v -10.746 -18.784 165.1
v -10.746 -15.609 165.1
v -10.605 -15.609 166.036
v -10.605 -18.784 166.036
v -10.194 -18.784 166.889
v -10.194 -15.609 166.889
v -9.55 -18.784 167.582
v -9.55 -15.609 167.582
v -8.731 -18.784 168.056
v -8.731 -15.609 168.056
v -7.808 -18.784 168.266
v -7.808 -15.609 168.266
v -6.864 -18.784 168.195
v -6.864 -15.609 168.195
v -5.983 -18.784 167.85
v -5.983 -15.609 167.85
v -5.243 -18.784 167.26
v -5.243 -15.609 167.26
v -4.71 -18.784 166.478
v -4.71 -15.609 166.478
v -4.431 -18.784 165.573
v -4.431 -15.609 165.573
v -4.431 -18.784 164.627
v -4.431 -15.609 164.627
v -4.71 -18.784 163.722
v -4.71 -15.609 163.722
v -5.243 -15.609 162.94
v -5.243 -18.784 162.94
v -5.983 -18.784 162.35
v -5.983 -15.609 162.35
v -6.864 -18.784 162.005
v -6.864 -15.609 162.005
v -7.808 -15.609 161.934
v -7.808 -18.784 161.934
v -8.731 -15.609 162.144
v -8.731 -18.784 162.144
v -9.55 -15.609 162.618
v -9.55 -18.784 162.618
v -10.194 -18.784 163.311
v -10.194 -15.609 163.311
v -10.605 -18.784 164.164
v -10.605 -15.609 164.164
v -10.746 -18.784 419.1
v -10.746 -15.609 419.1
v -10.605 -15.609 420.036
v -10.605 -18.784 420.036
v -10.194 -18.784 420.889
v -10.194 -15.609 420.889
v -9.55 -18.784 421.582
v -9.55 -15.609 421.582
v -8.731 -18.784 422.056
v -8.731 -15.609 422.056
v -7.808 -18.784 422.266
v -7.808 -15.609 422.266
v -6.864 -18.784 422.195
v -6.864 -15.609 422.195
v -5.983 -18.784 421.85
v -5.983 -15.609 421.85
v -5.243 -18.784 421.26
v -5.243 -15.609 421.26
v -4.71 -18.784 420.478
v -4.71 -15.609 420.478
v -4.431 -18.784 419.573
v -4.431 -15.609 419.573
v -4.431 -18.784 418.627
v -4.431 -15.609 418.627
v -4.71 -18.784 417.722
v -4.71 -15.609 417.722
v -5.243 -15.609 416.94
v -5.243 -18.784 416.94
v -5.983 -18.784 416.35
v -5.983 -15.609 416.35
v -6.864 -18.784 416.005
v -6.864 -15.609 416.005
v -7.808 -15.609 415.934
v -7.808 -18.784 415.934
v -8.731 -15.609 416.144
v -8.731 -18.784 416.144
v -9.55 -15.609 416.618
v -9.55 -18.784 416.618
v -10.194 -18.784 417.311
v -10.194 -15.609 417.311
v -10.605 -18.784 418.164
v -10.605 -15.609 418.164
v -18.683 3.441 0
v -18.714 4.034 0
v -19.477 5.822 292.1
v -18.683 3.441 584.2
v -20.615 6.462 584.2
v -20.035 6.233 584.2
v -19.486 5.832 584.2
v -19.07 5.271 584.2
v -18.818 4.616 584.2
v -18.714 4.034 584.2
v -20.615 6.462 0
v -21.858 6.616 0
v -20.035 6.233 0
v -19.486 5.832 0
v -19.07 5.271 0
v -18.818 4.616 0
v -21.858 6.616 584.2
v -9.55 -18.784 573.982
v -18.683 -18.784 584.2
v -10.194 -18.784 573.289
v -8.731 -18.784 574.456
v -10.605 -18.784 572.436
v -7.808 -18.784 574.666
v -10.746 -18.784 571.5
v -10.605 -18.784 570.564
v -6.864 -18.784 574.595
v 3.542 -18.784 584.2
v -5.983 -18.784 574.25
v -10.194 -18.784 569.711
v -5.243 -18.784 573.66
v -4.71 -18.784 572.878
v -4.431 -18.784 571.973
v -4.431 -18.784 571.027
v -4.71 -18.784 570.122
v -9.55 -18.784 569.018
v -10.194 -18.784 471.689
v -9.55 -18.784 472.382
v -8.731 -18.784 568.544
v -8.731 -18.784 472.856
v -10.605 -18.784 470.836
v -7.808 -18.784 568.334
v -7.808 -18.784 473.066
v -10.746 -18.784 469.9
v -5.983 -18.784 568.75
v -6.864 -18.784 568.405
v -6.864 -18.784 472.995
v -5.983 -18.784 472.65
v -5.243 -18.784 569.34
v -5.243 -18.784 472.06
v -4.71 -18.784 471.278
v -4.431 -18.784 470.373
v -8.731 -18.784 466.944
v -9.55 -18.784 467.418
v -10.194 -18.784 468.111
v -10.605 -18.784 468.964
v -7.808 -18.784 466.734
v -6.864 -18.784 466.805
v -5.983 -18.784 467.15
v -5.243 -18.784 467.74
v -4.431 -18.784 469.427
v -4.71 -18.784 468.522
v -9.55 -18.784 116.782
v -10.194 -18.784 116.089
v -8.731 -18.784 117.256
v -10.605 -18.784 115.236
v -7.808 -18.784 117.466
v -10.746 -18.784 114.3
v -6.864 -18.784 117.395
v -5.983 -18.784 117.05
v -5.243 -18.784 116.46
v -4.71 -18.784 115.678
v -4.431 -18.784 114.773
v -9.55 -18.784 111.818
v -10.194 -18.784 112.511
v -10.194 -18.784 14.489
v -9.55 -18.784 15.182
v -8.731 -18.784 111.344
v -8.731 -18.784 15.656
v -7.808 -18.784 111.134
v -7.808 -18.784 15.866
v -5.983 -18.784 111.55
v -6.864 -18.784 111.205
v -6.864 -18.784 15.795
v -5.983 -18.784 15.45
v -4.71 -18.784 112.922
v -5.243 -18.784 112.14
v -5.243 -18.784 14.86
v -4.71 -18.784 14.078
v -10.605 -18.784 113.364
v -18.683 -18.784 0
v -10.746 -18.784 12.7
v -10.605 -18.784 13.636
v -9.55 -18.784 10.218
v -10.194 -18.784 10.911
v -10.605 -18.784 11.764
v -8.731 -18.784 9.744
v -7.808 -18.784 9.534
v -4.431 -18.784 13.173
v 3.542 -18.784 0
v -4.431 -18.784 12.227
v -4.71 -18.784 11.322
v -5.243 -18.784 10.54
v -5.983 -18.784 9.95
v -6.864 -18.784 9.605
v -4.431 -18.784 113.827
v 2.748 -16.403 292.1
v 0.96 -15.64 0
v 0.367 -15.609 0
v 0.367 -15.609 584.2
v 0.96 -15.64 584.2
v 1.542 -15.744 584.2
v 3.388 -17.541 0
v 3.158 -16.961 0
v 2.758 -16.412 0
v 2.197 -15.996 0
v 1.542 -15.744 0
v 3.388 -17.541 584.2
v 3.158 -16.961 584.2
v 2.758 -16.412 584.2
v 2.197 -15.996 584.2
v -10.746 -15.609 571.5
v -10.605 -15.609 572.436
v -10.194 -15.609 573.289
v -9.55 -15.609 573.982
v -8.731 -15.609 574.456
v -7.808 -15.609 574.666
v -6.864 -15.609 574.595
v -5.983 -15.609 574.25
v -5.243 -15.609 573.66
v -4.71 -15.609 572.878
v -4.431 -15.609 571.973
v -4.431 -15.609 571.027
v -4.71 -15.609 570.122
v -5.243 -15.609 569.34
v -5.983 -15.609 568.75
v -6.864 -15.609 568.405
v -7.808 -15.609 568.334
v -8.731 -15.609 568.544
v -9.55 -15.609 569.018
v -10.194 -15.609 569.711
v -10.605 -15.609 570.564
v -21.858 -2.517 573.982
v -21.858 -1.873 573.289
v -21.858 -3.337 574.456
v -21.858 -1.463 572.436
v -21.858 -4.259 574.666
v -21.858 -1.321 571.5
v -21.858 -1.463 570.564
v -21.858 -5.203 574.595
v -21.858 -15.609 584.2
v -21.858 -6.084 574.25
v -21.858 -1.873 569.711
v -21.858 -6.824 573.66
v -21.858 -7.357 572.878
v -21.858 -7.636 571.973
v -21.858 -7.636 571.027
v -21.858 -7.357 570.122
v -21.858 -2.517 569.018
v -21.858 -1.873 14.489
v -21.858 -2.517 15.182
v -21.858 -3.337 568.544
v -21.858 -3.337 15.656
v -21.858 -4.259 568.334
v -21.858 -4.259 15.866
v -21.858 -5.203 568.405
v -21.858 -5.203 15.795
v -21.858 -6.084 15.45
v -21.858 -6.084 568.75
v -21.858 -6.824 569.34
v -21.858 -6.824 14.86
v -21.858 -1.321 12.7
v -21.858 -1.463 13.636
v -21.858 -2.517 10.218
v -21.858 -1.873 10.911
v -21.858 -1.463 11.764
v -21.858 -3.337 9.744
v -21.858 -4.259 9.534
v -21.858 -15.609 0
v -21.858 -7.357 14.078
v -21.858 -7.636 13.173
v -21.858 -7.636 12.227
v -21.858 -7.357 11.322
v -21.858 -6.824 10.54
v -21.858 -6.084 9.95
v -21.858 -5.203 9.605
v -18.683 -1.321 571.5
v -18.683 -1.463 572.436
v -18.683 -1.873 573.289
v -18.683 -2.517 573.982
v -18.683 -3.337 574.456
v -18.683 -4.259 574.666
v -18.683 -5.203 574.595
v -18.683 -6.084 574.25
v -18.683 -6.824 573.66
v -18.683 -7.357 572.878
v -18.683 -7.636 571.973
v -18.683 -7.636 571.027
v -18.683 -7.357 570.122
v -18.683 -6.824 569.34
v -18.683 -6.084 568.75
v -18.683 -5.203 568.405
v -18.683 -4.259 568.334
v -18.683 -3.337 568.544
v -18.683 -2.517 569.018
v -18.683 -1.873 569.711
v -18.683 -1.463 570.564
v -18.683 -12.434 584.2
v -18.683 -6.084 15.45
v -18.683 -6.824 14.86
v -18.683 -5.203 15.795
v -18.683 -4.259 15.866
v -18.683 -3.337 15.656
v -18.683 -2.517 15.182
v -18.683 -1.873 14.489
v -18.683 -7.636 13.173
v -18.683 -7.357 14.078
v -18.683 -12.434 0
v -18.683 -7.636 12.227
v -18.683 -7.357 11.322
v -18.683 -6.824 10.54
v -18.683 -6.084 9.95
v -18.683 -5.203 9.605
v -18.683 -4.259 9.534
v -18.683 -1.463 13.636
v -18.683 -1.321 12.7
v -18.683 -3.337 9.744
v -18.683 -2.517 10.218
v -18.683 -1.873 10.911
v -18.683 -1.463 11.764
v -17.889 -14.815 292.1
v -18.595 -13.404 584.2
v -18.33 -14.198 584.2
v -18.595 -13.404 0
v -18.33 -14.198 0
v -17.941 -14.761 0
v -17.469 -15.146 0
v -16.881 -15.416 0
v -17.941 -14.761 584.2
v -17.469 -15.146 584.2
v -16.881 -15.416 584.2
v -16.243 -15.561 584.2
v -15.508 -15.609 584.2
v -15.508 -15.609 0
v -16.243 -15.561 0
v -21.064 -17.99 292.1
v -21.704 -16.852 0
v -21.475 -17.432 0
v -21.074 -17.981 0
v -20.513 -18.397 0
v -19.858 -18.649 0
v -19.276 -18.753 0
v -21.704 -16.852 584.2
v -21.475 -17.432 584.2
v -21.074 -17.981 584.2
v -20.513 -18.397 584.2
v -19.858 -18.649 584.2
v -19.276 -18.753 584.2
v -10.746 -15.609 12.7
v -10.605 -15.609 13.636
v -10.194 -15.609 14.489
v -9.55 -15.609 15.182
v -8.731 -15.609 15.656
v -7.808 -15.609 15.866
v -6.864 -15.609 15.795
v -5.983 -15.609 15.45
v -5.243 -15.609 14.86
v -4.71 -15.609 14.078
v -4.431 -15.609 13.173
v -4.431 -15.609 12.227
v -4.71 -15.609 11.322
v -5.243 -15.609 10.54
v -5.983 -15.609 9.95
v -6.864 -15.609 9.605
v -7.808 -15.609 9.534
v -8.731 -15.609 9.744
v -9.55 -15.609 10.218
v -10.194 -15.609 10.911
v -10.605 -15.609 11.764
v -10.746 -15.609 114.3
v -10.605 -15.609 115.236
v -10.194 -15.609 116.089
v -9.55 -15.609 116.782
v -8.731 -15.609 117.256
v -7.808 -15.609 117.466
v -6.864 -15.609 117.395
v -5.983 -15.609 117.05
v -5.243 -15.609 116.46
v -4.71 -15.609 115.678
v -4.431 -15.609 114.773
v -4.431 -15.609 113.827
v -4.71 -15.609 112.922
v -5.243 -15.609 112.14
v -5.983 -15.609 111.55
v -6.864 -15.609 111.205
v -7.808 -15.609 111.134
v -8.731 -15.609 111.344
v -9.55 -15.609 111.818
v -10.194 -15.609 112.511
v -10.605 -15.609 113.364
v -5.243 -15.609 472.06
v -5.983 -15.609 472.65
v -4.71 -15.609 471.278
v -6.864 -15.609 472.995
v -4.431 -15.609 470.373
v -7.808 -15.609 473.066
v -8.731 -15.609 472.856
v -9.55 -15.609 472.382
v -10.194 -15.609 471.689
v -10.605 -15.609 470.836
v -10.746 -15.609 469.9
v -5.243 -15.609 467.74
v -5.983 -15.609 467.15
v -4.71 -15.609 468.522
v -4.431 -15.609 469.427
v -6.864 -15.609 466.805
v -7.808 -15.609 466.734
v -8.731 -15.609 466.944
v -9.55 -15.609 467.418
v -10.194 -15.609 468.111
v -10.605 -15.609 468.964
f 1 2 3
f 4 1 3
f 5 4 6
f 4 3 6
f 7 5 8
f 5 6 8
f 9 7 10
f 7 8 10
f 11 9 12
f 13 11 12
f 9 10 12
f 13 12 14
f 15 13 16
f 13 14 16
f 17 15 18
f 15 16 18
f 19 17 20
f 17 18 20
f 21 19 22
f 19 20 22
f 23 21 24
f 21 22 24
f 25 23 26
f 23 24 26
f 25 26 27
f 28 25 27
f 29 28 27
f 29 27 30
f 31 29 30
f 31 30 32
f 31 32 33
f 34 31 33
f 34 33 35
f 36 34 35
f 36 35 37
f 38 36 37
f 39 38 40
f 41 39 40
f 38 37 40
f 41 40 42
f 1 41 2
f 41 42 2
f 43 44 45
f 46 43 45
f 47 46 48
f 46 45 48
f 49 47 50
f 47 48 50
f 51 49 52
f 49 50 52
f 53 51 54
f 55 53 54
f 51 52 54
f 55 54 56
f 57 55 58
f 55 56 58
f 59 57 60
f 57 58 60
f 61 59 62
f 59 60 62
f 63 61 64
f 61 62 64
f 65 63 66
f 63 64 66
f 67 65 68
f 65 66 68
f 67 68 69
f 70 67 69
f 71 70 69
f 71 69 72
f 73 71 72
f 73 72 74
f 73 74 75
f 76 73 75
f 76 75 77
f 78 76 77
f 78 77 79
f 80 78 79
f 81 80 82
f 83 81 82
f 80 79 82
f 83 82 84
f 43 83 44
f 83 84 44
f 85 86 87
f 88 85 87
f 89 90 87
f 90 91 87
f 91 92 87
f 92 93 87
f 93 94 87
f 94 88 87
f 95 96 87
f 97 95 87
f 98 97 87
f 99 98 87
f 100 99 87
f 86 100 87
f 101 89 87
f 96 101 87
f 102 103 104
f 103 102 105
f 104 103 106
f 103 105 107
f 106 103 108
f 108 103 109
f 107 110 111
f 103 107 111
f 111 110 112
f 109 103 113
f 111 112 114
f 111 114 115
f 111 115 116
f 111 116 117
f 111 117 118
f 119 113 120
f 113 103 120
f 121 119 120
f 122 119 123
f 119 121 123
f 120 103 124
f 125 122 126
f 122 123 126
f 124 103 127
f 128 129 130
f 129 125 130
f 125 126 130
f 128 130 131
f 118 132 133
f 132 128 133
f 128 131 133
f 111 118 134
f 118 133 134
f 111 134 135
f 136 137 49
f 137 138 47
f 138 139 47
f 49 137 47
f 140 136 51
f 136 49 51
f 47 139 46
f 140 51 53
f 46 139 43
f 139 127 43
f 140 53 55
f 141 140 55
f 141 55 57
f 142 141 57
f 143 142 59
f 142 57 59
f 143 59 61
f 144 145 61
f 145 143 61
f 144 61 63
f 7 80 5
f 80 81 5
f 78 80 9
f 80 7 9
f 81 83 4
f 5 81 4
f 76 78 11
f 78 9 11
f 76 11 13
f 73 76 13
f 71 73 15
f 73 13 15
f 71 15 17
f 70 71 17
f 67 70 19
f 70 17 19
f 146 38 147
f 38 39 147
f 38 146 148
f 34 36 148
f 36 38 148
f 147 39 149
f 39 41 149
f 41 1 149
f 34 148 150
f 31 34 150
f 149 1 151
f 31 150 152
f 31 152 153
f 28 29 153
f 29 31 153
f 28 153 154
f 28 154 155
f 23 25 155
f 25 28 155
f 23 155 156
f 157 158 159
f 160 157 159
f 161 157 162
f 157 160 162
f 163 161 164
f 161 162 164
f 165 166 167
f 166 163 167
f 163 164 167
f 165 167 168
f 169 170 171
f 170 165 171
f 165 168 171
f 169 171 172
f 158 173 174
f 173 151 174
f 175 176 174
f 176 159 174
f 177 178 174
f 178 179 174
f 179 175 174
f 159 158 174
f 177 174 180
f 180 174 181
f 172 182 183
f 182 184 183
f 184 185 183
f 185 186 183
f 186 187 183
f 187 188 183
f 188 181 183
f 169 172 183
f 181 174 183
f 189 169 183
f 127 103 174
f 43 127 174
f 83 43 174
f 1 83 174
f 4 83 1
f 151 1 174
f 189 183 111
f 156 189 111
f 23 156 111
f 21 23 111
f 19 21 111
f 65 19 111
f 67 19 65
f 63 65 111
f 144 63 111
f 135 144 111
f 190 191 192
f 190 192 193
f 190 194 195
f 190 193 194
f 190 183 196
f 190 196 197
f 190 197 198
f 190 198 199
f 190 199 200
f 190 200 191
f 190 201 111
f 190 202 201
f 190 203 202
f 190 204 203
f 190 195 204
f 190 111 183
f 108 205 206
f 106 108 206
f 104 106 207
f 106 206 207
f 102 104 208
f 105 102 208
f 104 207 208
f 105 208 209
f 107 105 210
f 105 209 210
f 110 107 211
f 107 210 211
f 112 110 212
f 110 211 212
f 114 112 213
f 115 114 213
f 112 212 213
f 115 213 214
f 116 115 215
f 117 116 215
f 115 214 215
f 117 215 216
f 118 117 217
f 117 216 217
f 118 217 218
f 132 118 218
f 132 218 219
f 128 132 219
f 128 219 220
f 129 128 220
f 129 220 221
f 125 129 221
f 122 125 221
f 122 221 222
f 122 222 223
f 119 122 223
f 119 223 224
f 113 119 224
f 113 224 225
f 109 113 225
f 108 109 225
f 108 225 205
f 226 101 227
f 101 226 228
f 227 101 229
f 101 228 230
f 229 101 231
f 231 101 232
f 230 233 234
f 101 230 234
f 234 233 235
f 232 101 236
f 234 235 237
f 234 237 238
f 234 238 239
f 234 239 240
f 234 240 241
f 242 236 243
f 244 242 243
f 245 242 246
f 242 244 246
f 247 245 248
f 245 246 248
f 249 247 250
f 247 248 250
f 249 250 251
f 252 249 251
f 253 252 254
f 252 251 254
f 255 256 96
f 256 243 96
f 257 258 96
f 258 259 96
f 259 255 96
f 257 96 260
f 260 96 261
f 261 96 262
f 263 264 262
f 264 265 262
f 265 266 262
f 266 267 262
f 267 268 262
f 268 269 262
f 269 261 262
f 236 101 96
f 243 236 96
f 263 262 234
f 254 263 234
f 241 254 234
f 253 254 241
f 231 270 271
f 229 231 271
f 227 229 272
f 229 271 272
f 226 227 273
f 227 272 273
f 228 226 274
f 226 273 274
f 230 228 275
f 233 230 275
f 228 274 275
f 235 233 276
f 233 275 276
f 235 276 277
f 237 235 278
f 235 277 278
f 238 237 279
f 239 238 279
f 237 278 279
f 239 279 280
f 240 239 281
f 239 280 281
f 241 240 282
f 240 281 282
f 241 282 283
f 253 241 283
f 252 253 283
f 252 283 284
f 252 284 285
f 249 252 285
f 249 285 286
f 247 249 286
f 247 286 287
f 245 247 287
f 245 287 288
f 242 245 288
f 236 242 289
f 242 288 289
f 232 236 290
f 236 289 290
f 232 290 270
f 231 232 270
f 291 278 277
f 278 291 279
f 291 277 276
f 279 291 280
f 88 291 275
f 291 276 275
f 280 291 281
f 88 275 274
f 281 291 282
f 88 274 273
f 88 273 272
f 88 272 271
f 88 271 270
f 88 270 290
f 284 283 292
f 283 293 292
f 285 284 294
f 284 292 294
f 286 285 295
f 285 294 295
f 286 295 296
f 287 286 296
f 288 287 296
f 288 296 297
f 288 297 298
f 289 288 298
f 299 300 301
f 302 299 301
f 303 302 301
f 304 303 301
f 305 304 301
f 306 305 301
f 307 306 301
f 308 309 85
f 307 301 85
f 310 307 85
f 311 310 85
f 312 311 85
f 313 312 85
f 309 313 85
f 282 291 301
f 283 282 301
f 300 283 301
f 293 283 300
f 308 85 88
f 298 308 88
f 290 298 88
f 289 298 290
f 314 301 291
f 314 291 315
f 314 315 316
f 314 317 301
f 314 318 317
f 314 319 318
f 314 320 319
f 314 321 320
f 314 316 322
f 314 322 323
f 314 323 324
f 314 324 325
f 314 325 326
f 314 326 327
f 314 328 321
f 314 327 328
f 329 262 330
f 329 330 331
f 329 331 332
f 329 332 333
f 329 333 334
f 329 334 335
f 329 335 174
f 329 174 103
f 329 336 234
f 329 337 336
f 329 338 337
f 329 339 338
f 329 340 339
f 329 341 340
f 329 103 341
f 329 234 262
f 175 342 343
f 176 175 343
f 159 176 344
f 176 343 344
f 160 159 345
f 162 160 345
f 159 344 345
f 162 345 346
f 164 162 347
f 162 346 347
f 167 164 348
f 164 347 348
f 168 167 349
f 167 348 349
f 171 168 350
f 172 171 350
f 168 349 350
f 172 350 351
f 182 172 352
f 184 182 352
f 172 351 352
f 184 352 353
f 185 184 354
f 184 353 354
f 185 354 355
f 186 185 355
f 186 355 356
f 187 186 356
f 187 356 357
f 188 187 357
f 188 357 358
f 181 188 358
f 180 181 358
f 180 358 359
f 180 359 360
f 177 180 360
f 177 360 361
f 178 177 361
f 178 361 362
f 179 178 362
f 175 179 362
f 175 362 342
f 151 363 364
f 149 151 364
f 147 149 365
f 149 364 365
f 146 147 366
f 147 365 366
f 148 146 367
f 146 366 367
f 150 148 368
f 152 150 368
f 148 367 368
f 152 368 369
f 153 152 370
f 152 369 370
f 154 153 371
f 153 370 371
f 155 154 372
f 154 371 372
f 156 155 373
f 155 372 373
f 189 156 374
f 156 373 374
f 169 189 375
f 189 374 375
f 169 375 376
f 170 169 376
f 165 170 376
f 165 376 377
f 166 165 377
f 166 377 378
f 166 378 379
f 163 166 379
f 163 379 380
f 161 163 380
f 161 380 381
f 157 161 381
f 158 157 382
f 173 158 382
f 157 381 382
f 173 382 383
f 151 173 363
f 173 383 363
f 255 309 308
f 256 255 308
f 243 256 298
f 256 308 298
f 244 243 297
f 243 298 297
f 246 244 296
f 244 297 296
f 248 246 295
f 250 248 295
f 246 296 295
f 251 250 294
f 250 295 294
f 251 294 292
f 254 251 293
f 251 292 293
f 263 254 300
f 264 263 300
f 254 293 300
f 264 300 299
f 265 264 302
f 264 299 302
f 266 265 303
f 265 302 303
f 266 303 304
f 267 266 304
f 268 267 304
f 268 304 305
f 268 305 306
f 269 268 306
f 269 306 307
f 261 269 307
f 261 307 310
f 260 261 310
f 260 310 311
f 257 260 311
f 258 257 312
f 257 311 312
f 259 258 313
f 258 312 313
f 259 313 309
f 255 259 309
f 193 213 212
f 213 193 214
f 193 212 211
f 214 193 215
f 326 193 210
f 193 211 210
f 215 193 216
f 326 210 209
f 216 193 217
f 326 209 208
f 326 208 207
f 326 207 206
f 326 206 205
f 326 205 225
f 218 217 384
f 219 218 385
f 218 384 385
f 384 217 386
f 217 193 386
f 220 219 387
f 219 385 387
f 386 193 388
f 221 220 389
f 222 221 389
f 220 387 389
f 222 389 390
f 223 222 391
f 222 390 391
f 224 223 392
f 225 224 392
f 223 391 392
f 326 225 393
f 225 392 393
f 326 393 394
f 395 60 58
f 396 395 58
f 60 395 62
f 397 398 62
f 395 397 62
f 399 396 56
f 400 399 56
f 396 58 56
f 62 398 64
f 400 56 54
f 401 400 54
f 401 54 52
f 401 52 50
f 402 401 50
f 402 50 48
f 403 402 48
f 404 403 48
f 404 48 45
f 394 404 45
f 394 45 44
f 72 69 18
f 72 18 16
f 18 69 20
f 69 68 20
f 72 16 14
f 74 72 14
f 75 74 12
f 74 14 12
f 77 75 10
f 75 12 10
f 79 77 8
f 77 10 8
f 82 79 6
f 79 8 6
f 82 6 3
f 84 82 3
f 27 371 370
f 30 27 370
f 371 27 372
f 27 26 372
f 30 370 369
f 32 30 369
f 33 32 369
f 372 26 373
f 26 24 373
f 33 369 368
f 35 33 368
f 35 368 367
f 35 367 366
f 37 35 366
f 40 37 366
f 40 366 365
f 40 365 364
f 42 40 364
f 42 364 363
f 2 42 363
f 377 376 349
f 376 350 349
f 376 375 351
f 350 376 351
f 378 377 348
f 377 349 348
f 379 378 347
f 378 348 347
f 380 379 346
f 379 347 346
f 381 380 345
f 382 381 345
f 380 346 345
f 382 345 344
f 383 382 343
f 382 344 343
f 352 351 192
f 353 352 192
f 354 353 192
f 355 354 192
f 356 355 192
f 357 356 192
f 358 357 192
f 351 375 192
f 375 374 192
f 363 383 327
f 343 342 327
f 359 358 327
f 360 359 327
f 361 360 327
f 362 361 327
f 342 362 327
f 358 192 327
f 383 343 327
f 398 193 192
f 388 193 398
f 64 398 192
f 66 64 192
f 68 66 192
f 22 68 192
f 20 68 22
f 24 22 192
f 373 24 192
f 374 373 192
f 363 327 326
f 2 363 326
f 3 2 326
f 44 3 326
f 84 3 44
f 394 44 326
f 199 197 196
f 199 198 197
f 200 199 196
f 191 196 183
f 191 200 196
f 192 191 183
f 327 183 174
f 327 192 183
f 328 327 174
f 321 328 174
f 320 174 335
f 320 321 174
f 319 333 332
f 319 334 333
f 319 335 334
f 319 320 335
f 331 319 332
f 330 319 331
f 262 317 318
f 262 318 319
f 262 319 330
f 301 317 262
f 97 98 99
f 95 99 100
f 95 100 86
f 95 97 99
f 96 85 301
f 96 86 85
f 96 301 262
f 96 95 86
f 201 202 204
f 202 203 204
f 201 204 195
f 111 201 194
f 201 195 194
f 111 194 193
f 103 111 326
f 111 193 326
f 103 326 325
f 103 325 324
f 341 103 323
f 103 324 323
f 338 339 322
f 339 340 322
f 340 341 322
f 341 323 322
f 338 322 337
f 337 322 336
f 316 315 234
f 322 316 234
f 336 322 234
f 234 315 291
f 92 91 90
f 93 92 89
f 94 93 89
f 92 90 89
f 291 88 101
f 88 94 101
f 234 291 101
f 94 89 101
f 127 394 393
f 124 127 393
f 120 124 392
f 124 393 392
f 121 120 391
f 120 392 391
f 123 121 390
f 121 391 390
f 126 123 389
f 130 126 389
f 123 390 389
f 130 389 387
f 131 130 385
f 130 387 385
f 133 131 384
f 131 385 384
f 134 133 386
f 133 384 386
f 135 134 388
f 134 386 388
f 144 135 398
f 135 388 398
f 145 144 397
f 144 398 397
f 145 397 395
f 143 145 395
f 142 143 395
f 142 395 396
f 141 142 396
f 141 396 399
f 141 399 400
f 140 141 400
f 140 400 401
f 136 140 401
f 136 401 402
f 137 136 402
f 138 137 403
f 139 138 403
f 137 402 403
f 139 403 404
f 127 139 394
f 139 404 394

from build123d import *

# Parameters (mm, degrees)
F1_DEPTH    = 584.2
F2_R        = 3.175
F3_DEPTH    = 3.175
F4_R        = 3.175
F5_DEPTH    = 25.4
F6_T1_DEPTH = 600.075
F7_T1_DEPTH = 584.2
F7_T3_DEPTH = 600.075
F8_R        = 3.175
F9_DEPTH    = 3.175


# Not quite as in the source:
# - a fillet or chamfer that OpenCascade refuses, or shapes differently, is made with other operations: its cross-section is extruded or revolved along the edge and cut away or added


with BuildPart() as f1:
    # F0 (on Top) → F1 (new body)
    with BuildSketch(Plane.XY):
        Polygon((-18.6830897415, 6.6160263166), (-21.8580897415, 6.6160263166), (-21.8580897415, -18.7839736834), (3.5419102585, -18.7839736834), (3.5419102585, -15.6089736834), (-18.6830897415, -15.6089736834), align=None)
    extrude(amount=F1_DEPTH)

    # F2 (on face) → F3 (cut)
    with BuildSketch(Plane.YZ.offset(-18.6830897415)):
        with Locations((-4.4964736834, 571.5)):
            Circle(F2_R)
        with Locations((-4.4964736834, 12.7)):
            Circle(F2_R)
    extrude(amount=-F3_DEPTH, mode=Mode.SUBTRACT)

    # F4 (on face) → F5 (cut)
    with BuildSketch(Plane(origin=(0, -15.6089736834, 0), x_dir=(-1, 0, 0), z_dir=(0, 1, 0))):
        with Locations((7.5705897415, 12.7)):
            Circle(F4_R)
        with Locations((7.5705897415, 571.5)):
            Circle(F4_R)
    extrude(amount=-F5_DEPTH, mode=Mode.SUBTRACT)

    # F6: fillet of radius 3.175 on 2 edges, made by hand

    # F6_s2 → F6_t1 (cut)
    with BuildSketch(Plane.XY.offset(-7.9375)):
        with BuildLine():
            add(Edge.make_bspline(
                [(0.3669102585, -15.6089736834), (3.5419102585, -15.6089736834), (3.5419102585, -18.7839736834)],
                knots=[0, 0, 0, 1, 1, 1], degree=2, weights=[1, 1, 1]))
            Line((3.5419102585, -18.7839736834), (3.5419102585, -15.6089736834))
            Line((3.5419102585, -15.6089736834), (0.3669102585, -15.6089736834))
        make_face()
        with BuildLine():
            add(Edge.make_bspline(
                [(-18.6830897415, 3.4410263166), (-18.6830897415, 6.6160263166), (-21.8580897415, 6.6160263166)],
                knots=[0, 0, 0, 1, 1, 1], degree=2, weights=[1, 1, 1]))
            Line((-21.8580897415, 6.6160263166), (-18.6830897415, 6.6160263166))
            Line((-18.6830897415, 6.6160263166), (-18.6830897415, 3.4410263166))
        make_face()
    extrude(amount=F6_T1_DEPTH, mode=Mode.SUBTRACT)

    # F7: fillet of radius 3.175 on 2 edges, made by hand

    # F7_s2 → F7_t1 (join)
    with BuildSketch(Plane.XY):
        with BuildLine():
            add(Edge.make_bspline(
                [(-18.6830897415, -12.4339736834), (-18.6830897415, -15.6089736834), (-15.5080897415, -15.6089736834)],
                knots=[0, 0, 0, 1, 1, 1], degree=2, weights=[1, 1, 1]))
            Line((-15.5080897415, -15.6089736834), (-18.6830897415, -15.6089736834))
            Line((-18.6830897415, -15.6089736834), (-18.6830897415, -12.4339736834))
        make_face()
    extrude(amount=F7_T1_DEPTH)

    # F7_s4 → F7_t3 (cut)
    with BuildSketch(Plane.XY.offset(-7.9375)):
        with BuildLine():
            add(Edge.make_bspline(
                [(-18.6830897415, -18.7839736834), (-21.8580897415, -18.7839736834), (-21.8580897415, -15.6089736834)],
                knots=[0, 0, 0, 1, 1, 1], degree=2, weights=[1, 1, 1]))
            Line((-21.8580897415, -15.6089736834), (-21.8580897415, -18.7839736834))
            Line((-21.8580897415, -18.7839736834), (-18.6830897415, -18.7839736834))
        make_face()
    extrude(amount=F7_T3_DEPTH, mode=Mode.SUBTRACT)

    # F8 (on face) → F9 (cut)
    with BuildSketch(Plane(origin=(0, -15.6089736834, 0), x_dir=(-1, 0, 0), z_dir=(0, 1, 0))):
        with Locations((7.5705897415, 165.1)):
            Circle(F8_R)
        with Locations((7.5705897415, 114.3)):
            Circle(F8_R)
        with Locations((7.5705897415, 469.9)):
            Circle(F8_R)
        with Locations((7.5705897415, 419.1)):
            Circle(F8_R)
    extrude(amount=-F9_DEPTH, mode=Mode.SUBTRACT)


solid = f1.part
